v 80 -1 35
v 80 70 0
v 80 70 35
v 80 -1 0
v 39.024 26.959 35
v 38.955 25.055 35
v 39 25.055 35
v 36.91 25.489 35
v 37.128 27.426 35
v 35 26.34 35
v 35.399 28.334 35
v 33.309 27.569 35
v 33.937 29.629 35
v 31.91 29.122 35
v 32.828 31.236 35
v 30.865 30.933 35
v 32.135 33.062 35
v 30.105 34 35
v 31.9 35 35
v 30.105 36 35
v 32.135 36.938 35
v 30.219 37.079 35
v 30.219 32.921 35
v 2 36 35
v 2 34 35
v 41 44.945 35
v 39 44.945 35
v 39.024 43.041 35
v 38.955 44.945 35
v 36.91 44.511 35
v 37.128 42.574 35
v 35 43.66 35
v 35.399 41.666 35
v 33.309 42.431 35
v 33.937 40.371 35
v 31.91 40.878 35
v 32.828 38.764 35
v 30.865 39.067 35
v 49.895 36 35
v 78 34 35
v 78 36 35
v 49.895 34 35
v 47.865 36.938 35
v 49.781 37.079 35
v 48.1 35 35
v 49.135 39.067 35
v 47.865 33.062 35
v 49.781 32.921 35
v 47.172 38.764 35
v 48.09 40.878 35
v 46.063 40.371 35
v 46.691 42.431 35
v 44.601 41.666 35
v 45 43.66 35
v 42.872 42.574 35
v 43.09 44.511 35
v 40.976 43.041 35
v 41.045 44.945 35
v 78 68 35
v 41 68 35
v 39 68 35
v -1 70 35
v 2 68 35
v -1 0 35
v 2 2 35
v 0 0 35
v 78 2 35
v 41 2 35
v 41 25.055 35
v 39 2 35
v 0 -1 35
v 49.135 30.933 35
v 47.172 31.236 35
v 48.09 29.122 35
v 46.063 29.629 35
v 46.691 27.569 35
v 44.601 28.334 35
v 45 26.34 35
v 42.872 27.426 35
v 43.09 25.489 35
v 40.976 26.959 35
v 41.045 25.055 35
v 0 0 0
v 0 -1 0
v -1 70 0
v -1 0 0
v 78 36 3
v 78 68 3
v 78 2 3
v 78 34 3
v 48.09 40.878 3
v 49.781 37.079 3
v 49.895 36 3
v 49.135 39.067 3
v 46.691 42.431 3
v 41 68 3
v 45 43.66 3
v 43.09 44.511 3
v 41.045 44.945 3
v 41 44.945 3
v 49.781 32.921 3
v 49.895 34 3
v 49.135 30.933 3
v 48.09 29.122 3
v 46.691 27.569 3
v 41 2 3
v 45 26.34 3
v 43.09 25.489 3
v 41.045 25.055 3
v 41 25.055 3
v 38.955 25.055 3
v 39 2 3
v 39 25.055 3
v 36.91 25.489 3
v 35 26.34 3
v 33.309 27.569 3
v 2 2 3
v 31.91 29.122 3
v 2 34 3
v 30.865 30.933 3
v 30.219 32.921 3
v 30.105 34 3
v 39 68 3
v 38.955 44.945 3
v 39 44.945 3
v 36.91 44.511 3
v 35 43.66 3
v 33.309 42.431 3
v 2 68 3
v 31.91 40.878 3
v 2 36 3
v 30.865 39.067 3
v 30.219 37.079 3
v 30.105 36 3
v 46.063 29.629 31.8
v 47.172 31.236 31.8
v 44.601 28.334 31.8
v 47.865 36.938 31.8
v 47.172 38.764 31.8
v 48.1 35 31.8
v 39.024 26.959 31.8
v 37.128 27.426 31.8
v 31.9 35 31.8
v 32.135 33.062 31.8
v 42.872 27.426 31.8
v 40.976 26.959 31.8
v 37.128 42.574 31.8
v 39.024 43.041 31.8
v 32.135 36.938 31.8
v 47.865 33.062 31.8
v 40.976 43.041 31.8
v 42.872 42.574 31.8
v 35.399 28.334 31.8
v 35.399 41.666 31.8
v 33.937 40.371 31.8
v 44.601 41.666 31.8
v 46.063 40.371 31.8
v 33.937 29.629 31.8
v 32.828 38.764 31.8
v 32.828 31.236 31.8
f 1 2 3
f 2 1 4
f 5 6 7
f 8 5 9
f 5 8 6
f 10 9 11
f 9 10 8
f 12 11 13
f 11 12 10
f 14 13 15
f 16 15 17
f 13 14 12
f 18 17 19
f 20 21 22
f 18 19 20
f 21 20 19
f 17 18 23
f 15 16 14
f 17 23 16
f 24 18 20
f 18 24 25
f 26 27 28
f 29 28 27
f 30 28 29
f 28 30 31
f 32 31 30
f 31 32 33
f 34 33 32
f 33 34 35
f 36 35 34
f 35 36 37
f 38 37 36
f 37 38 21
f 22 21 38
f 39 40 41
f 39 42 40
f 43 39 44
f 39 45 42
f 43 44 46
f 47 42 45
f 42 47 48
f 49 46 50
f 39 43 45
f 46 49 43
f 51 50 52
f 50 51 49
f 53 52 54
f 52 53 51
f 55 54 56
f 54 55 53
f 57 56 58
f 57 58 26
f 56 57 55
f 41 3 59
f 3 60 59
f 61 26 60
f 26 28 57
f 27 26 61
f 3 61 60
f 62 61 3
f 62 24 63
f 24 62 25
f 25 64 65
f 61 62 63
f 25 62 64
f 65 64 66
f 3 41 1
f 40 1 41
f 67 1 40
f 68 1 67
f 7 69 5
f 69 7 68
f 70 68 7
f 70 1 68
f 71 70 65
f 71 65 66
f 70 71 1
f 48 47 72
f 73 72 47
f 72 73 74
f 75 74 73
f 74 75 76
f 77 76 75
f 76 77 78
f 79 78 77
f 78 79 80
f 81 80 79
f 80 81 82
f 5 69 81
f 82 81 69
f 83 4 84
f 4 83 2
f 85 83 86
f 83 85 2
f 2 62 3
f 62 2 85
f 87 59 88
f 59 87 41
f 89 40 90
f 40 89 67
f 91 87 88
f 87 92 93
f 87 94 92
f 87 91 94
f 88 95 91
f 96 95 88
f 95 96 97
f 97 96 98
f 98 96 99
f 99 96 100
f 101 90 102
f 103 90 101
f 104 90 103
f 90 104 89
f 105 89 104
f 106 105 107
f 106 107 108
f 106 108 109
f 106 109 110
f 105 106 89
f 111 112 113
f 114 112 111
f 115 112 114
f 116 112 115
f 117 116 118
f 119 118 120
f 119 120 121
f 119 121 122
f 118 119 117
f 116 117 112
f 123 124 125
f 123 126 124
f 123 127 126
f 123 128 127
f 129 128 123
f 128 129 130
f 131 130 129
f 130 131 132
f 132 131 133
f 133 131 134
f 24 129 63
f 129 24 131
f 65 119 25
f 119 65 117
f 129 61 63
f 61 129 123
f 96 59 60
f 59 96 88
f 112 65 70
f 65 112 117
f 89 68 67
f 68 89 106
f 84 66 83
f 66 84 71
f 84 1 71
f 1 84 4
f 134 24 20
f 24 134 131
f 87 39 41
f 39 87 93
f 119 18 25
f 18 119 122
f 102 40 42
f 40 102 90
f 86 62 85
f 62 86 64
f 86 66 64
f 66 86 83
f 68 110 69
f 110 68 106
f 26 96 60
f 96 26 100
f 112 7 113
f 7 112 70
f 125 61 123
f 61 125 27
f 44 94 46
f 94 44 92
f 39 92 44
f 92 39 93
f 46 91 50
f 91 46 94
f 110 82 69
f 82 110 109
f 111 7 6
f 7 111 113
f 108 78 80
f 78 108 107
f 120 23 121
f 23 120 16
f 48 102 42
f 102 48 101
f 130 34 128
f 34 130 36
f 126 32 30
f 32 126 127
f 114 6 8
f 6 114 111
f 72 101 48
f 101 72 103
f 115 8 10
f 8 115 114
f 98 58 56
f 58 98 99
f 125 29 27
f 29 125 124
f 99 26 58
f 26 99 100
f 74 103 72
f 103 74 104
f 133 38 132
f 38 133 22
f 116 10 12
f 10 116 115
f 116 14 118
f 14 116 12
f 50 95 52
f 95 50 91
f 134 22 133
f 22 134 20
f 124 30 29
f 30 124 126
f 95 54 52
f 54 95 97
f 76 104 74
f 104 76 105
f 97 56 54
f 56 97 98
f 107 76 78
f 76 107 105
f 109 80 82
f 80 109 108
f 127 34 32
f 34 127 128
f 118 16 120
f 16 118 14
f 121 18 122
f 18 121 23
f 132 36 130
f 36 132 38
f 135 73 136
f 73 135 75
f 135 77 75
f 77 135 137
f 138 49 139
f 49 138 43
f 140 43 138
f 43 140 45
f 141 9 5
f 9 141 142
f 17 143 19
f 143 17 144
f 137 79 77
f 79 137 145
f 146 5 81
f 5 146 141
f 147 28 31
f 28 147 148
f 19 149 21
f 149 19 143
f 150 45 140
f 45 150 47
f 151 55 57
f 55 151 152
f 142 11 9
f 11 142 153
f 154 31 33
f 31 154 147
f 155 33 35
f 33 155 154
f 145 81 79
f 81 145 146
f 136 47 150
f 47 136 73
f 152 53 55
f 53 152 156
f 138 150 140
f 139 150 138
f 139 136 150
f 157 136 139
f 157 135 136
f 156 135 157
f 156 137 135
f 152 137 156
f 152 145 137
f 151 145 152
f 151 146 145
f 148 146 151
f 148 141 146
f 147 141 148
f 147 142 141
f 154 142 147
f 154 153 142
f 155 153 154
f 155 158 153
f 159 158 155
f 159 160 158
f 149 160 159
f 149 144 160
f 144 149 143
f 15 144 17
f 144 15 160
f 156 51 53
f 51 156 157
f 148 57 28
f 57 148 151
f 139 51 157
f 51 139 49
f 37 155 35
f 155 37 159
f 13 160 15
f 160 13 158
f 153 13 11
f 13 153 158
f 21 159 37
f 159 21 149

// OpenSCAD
length = 80;
width = 70;
height = 35;
wallThickness = 2;
floorThickness = 3;
widthDividers = 1;
lengthDividers = 1;

//Based on magnet size:
magnetBaseOuterDiameter = 20;
magnetBaseInnerDiameter = 16.2;
magnetHeight = 3.2;


difference(){
    cube([length, width, height]);
    translate([wallThickness, wallThickness, floorThickness])
        cube([length - wallThickness * 2,width - wallThickness * 2, height - floorThickness]);
}
widthSections = widthDividers + 1;
lengthSections = lengthDividers + 1;
difference() {
    union() {
        
        for(index=[0:widthDividers])
            translate([0, (width/widthSections) * index - (wallThickness/2), 0])
                cube([length, wallThickness, height]);
        for(index=[0:lengthDividers])
            translate([ (length/lengthSections) * index - (wallThickness/2), 0, 0])
                cube([wallThickness, width, height]);
        
        translate([length/2, width/2, 0])
            cylinder(height, d=magnetBaseOuterDiameter);
    };
    translate([length/2, width/2, height - magnetHeight])
        cylinder(magnetHeight, d=magnetBaseInnerDiameter);
};
